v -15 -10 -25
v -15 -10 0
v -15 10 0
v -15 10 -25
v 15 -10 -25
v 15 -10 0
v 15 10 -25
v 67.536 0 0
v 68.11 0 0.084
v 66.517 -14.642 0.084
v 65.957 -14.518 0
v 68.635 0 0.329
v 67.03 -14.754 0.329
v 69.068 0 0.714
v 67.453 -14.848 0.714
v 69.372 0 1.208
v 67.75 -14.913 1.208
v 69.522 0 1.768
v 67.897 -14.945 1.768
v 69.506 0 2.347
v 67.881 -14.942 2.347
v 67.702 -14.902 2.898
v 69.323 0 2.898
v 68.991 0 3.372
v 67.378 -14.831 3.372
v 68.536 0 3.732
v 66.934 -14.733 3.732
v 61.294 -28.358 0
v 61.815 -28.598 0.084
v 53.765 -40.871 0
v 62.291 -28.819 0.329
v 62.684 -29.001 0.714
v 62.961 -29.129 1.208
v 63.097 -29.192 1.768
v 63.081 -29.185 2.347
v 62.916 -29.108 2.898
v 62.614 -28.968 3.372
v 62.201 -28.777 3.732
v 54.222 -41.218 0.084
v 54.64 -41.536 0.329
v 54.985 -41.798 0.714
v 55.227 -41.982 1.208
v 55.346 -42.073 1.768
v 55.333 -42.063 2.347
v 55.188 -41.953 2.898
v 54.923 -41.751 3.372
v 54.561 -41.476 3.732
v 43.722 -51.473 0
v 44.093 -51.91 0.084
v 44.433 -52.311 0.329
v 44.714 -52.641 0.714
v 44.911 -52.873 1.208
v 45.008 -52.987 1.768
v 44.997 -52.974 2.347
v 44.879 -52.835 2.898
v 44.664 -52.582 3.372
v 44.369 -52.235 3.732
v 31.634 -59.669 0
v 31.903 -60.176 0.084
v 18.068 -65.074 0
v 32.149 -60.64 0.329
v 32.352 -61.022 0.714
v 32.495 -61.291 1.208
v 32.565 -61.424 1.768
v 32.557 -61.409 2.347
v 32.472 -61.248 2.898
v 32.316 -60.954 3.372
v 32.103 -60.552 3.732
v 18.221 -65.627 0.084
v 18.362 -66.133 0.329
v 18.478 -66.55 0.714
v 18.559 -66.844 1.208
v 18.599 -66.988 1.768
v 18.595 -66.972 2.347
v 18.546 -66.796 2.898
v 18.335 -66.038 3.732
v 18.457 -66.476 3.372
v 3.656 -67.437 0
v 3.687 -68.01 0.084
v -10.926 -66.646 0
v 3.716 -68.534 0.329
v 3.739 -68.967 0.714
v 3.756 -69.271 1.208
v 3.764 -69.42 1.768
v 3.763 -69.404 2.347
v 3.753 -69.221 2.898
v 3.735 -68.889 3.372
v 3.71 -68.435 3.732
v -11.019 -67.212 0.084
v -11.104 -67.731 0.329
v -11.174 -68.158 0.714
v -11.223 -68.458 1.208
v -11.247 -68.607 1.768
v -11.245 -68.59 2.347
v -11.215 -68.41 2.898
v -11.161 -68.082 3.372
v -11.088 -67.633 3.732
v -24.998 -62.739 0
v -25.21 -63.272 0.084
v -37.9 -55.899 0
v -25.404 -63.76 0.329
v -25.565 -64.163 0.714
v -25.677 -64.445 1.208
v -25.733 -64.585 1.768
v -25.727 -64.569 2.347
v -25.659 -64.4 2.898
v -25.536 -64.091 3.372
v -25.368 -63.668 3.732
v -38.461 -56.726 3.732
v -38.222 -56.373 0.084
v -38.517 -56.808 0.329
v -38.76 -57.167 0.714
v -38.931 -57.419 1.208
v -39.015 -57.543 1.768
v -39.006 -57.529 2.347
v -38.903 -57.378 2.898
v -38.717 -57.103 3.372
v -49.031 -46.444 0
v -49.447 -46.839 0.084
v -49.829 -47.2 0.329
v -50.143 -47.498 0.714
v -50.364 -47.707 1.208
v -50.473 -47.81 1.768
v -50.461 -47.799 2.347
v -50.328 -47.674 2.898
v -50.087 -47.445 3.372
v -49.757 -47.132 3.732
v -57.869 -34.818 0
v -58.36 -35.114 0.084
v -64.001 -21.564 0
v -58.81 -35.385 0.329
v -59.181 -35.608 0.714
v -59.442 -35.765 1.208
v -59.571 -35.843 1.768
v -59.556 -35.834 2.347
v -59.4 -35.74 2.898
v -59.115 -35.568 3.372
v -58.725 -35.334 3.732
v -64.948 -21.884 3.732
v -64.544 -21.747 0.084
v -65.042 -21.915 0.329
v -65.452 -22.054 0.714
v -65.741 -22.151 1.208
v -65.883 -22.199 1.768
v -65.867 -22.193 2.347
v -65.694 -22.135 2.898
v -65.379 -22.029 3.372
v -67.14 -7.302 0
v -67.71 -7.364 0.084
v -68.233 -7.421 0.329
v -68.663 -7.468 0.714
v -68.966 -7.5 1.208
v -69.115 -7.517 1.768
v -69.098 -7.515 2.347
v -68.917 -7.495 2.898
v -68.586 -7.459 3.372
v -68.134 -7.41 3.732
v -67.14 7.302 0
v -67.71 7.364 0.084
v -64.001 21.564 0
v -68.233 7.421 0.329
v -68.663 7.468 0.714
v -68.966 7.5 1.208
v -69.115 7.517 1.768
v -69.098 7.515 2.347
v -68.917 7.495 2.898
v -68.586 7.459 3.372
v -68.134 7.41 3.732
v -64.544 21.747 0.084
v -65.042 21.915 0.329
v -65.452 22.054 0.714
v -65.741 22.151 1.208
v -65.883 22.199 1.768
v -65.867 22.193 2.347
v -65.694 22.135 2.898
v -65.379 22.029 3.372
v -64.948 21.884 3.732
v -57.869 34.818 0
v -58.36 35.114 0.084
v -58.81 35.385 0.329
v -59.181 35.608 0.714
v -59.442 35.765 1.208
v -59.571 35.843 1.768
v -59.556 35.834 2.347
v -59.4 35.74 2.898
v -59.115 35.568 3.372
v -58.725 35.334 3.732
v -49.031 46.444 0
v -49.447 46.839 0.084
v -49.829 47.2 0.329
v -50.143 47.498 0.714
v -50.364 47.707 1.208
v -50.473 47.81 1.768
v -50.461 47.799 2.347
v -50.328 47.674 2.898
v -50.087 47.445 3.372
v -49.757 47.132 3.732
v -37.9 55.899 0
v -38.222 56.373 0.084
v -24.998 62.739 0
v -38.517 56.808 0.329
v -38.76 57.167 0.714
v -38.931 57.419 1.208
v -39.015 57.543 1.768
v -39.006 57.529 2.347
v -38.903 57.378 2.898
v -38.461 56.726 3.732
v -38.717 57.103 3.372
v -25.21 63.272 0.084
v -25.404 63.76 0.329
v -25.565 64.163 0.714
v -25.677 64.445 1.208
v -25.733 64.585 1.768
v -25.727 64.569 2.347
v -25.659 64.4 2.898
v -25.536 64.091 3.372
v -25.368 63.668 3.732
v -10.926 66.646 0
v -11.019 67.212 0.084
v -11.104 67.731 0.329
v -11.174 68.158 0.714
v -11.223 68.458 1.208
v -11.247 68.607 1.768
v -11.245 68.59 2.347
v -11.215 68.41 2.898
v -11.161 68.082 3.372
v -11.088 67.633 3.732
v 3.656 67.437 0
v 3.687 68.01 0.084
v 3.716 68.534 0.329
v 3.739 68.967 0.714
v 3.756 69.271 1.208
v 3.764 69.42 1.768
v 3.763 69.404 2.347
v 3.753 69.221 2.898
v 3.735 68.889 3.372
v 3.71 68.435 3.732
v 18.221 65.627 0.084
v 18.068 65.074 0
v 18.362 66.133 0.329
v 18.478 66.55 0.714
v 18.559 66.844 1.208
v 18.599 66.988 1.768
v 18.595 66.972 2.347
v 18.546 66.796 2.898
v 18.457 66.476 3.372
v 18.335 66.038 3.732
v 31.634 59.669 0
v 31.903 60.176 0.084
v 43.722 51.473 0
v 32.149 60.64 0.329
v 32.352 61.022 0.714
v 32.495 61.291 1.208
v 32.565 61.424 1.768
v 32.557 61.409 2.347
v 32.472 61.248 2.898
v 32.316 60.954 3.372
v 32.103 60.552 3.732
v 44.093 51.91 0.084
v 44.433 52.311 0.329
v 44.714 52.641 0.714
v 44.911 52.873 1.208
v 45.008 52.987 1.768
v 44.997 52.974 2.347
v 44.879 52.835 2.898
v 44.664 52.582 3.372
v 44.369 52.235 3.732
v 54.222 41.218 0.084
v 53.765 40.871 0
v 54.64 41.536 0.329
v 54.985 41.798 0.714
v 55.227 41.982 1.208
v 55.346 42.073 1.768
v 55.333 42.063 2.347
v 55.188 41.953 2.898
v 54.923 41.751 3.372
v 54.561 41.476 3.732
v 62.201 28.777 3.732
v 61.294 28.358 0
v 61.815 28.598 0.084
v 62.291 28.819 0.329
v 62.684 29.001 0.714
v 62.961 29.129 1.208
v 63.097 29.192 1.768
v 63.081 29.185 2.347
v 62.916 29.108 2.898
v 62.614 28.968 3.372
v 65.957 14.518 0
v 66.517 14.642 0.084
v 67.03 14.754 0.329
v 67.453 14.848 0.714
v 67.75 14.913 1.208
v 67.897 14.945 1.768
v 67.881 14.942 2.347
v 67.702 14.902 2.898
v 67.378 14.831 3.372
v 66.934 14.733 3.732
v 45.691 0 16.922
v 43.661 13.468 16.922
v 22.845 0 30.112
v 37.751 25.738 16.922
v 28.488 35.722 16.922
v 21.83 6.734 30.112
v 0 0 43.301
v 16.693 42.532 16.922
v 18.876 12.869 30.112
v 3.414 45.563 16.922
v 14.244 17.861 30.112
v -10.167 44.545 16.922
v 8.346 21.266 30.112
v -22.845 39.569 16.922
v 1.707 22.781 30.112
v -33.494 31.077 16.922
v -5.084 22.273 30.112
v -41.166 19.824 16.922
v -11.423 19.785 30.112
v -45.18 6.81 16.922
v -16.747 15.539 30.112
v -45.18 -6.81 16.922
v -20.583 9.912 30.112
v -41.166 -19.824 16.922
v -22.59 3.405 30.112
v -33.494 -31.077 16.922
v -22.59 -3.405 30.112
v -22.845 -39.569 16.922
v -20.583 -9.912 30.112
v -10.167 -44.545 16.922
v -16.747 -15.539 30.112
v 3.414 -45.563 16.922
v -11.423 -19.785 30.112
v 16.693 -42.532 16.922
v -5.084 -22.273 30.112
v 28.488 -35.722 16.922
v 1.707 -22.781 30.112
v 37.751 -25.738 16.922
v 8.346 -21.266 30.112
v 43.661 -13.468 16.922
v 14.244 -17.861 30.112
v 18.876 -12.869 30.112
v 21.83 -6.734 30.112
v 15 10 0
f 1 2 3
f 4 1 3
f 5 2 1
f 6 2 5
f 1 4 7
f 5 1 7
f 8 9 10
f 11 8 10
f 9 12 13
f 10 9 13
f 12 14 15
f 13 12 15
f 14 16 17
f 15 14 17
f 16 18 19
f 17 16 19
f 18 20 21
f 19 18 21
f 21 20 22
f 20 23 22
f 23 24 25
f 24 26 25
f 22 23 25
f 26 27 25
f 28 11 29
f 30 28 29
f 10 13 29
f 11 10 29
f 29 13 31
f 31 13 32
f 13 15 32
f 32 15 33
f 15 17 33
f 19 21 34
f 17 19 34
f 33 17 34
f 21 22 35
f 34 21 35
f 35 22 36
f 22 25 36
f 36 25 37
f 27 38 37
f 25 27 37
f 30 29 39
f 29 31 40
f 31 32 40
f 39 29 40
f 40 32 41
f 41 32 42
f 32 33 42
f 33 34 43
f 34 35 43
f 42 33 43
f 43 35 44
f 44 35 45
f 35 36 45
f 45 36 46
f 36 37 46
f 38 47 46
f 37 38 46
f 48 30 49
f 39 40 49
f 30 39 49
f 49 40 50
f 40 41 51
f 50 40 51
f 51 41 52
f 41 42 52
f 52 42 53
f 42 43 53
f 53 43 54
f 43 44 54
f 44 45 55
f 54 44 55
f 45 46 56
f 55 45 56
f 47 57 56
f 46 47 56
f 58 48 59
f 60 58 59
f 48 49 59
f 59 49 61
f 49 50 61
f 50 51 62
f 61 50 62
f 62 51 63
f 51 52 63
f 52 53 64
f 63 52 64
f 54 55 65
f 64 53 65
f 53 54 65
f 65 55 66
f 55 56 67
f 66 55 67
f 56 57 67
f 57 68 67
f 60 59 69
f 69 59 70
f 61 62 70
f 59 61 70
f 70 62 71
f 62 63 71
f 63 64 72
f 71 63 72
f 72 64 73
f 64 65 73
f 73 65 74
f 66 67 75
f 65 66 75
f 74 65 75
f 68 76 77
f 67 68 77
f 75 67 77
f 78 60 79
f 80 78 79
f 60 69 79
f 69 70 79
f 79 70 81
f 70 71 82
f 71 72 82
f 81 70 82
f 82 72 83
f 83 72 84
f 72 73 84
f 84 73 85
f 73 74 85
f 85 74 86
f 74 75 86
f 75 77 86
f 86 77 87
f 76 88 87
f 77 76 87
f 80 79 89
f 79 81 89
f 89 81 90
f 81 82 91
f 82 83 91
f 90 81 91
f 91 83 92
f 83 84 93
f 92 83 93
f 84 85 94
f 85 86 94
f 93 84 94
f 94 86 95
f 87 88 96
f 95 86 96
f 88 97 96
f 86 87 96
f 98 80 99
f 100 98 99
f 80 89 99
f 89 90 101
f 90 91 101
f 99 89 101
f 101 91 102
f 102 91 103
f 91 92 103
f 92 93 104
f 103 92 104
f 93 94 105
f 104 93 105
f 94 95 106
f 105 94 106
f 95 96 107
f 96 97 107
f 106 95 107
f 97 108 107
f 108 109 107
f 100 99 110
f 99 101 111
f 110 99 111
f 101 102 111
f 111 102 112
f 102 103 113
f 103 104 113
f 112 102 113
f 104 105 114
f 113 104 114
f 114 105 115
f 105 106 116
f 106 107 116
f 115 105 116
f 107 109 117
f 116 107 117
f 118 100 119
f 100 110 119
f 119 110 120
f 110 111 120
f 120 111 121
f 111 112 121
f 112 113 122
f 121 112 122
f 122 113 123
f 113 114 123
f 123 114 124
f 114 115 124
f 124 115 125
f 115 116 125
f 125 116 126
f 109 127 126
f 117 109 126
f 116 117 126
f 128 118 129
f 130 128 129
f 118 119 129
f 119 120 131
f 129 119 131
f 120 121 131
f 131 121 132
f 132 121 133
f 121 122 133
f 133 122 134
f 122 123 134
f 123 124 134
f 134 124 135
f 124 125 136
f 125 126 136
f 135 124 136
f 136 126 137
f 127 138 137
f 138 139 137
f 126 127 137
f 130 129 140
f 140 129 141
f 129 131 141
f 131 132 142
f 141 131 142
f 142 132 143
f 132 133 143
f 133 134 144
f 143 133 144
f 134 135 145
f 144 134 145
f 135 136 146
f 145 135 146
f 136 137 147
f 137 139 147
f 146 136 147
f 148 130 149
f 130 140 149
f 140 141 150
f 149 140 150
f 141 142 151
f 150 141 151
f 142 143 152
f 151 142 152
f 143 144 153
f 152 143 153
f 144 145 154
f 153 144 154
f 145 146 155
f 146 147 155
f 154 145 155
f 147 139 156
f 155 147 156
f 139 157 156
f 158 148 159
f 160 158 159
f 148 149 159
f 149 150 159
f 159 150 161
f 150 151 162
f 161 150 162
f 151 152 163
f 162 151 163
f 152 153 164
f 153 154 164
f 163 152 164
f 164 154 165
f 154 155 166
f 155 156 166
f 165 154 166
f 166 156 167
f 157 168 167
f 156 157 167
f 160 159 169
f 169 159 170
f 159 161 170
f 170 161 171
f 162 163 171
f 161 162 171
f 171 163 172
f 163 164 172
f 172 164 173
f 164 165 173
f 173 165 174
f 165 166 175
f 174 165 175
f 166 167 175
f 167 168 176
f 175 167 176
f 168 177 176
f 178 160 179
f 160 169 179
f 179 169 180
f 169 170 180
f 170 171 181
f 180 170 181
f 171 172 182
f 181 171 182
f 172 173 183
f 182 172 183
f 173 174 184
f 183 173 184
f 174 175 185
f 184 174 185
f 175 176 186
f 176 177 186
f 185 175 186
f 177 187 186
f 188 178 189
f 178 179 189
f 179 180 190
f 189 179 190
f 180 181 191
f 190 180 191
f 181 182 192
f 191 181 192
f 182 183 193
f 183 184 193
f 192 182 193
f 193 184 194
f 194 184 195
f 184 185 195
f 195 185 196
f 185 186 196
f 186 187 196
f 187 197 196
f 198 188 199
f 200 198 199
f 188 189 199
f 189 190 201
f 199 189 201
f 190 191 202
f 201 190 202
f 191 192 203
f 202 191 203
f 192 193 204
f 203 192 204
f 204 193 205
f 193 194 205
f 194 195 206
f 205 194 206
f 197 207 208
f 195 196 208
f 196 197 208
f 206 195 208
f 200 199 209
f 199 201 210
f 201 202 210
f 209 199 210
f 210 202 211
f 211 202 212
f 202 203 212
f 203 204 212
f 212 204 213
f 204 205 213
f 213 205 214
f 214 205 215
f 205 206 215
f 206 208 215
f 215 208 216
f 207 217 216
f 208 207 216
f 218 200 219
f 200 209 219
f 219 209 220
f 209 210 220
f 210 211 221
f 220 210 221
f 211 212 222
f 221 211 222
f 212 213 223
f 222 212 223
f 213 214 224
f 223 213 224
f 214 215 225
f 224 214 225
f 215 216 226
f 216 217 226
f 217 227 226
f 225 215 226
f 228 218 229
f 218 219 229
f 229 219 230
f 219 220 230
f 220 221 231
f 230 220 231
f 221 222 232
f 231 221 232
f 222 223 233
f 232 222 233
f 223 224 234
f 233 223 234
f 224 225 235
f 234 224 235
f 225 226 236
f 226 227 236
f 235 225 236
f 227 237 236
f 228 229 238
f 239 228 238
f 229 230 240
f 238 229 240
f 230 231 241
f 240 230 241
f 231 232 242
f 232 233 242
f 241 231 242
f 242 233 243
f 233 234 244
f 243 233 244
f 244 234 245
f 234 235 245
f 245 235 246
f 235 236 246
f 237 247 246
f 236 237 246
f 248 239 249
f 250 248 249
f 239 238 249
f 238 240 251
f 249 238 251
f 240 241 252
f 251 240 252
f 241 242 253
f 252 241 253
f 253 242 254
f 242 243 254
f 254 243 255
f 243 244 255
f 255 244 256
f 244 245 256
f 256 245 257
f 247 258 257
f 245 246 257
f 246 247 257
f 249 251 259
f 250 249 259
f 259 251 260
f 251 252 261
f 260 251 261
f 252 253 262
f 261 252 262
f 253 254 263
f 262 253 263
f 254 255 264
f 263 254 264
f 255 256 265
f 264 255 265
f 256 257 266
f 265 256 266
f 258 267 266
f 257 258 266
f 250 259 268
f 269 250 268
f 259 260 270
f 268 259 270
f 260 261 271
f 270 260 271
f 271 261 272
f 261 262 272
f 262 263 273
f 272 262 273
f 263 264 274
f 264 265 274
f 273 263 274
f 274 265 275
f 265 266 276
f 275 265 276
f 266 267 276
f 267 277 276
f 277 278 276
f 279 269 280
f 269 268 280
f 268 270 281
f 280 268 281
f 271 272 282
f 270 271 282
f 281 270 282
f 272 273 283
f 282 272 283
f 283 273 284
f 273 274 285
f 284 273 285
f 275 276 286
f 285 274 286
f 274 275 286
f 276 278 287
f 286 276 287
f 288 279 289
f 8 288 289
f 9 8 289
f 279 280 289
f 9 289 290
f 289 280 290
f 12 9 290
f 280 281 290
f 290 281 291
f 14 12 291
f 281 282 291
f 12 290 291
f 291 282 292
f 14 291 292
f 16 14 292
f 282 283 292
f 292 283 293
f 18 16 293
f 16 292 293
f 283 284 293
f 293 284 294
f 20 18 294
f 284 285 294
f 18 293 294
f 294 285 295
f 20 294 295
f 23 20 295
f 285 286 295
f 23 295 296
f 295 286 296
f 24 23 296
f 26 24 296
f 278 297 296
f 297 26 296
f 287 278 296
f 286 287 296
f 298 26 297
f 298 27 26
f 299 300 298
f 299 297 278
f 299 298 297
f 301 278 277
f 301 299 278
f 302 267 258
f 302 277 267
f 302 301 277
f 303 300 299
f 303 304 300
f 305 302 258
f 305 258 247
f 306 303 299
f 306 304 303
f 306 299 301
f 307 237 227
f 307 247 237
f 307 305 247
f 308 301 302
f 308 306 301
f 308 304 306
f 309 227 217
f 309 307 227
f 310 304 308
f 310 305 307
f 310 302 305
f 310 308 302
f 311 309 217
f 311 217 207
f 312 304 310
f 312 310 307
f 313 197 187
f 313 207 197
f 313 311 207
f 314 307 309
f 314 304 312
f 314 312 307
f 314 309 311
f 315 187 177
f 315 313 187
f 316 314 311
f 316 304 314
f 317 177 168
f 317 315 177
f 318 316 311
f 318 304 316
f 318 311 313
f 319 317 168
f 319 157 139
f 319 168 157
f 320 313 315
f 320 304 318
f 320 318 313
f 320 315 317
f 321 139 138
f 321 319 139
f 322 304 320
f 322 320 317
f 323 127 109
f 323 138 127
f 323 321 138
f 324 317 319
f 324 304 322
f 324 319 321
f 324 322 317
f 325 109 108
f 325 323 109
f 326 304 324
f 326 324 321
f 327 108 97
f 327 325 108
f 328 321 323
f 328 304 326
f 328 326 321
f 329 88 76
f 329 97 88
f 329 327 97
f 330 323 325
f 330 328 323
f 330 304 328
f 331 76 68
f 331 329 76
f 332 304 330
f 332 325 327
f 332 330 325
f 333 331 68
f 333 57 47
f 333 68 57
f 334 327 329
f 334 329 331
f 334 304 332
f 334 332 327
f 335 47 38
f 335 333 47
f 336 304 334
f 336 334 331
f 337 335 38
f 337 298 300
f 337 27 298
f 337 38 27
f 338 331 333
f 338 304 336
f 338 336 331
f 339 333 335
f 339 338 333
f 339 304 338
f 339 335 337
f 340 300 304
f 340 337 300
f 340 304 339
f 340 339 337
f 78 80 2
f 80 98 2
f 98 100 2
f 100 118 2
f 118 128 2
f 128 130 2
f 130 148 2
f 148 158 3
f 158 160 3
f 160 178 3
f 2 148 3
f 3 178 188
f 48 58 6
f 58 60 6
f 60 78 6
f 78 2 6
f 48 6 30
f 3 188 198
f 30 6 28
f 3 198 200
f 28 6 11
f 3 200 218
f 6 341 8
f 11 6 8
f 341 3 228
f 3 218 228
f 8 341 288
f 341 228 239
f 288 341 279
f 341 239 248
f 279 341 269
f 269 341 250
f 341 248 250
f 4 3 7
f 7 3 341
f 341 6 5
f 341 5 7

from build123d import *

# Parameters (mm, degrees)
F0_R     = 75
F1_DEPTH = 50
F1_TAPER = 60
F2_W     = 30
F2_H     = 20
F3_DEPTH = 25
F4_R     = 2


with BuildPart() as f1:
    # F0 (on Top) → F1 (new body)
    with BuildSketch(Plane.XY):
        Circle(F0_R)
    extrude(amount=F1_DEPTH, taper=F1_TAPER)

    # F2 (on Top) → F3 (join)
    with BuildSketch(Plane.XY):
        Rectangle(F2_W, F2_H)
    extrude(amount=-F3_DEPTH)

    # F4
    f4_edges = [f1.edges().sort_by_distance(p)[0] for p in [
        (-75, 0, 0),
    ]]
    fillet(f4_edges, radius=F4_R)


solid = f1.part
